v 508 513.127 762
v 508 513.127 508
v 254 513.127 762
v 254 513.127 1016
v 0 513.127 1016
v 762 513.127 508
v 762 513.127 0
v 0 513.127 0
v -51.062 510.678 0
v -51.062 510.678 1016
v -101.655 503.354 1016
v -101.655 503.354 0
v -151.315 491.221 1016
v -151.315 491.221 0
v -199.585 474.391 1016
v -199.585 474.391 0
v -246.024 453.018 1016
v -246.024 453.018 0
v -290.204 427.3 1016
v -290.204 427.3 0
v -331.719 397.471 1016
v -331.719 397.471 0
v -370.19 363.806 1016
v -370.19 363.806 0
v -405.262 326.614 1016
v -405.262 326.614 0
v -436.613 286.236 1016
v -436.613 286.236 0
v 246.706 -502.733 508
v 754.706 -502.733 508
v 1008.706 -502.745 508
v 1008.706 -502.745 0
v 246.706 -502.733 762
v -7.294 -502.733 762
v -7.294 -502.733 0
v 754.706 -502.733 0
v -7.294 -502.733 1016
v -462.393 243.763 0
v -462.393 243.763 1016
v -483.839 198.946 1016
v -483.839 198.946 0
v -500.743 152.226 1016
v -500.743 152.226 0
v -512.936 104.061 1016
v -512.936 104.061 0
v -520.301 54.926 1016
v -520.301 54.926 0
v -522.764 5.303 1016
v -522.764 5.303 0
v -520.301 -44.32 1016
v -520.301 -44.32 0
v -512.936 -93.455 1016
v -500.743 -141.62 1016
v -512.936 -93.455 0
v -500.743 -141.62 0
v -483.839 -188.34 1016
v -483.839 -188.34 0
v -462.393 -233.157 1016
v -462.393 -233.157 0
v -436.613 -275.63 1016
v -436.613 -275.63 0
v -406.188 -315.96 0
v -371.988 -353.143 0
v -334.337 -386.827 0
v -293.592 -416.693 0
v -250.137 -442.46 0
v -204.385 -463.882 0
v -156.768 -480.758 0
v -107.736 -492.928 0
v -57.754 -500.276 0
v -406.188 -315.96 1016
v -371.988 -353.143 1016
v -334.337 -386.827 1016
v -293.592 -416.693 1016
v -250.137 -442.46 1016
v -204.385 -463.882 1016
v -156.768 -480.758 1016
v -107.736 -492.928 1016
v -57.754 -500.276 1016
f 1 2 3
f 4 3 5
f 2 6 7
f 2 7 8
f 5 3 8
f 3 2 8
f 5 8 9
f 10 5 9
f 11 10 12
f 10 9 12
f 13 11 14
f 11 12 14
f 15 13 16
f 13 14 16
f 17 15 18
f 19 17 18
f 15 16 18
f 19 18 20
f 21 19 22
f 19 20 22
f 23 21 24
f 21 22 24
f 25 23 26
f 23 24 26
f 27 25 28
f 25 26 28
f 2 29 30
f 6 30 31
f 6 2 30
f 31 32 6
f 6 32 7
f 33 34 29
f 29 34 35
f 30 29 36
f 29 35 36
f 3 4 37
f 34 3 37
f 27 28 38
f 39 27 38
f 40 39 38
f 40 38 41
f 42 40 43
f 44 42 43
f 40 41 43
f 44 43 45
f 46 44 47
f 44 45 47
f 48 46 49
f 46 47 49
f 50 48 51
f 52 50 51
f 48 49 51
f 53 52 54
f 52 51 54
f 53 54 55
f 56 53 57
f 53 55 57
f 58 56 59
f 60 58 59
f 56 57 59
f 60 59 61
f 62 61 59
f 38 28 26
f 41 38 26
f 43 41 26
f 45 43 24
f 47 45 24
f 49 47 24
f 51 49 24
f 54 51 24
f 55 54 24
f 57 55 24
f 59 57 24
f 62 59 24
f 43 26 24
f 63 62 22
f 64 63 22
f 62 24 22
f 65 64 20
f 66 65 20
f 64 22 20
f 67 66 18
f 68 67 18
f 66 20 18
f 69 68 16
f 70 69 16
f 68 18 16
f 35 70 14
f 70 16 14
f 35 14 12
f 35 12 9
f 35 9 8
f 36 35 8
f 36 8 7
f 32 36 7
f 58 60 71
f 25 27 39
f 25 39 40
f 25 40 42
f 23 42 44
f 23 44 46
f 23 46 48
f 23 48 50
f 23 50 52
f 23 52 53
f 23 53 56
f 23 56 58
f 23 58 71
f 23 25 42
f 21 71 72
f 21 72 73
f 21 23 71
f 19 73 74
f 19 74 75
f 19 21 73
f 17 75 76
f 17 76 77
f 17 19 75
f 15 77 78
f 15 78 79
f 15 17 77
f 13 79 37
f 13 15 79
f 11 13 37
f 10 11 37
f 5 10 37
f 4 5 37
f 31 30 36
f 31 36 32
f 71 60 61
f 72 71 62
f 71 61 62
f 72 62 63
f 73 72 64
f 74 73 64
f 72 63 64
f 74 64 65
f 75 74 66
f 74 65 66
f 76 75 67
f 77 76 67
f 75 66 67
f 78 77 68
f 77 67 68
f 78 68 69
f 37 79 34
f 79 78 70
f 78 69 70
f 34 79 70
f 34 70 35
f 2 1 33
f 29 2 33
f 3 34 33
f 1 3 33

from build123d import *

# Parameters (mm, degrees)
F1_DEPTH = 1016
F3_DEPTH = 254
F6_DEPTH = 508
F7_DEPTH = 25
F8_DEPTH = 100


with BuildPart() as f1:
    # F0 (on Top) → F1 (new body)
    with BuildSketch(Plane.XY):
        with BuildLine():
            Line((762, 513.1272309102), (0, 513.1272309102))
            ThreePointArc((0, 513.1272309102), (-246.0238589032, 453.018466107), (-436.6134349374, 286.2359242663))
            ThreePointArc((-436.6134349374, 286.2359242663), (-522.7640214805, 5.3030259362), (-436.6134349374, -275.629872394))
            ThreePointArc((-436.6134349374, -275.629872394), (-250.137217706, -442.4598438392), (-7.2941860889, -502.7332290138))
            Line((-7.2941860889, -502.7332290138), (754.7058139111, -502.7332290138))
            Line((754.7058139111, -502.7332290138), (1008.7058136281, -502.7452183176))
            Line((1008.7058136281, -502.7452183176), (762, 513.1272309102))
        make_face()
    extrude(amount=F1_DEPTH)

    # F2 (on face) → F3 (cut)
    with BuildSketch(Plane.XY.offset(1016)):
        Polygon((254, 513.1272309102), (-7.2941860889, -502.7332290138), (246.7058139111, -502.7332290138), (508, 513.1272309102), align=None)
    extrude(amount=-F3_DEPTH, mode=Mode.SUBTRACT)

    # F4 (on face) → F6 (cut)
    with BuildSketch(Plane.XY.offset(1016)):
        Polygon((246.7058139111, -502.7332290138), (754.7058139111, -502.7332290138), (1008.7058136281, -502.7452183176), (762, 513.1272309102), (508, 513.1272309102), align=None)
    extrude(amount=-F6_DEPTH, mode=Mode.SUBTRACT)


with BuildPart() as f7:
    # F5 (on face) → F7 (new body)
    with BuildSketch(Plane.XY.offset(1016)):
        Polygon((508, 513.1272309102), (246.7058139111, -502.7332290138), (754.7058139111, -502.7332290138), (1008.7058136281, -502.7452183176), (762, 513.1272309102), align=None)
    extrude(amount=F7_DEPTH)

    # F8 (cut): a face of the model
    f8_faces = [f7.faces().sort_by_distance(p)[0] for p in [
        (630.7450759157, -79.459043637, 1041),
    ]]
    extrude(f8_faces, amount=-F8_DEPTH, mode=Mode.SUBTRACT)


solid = f1.part
